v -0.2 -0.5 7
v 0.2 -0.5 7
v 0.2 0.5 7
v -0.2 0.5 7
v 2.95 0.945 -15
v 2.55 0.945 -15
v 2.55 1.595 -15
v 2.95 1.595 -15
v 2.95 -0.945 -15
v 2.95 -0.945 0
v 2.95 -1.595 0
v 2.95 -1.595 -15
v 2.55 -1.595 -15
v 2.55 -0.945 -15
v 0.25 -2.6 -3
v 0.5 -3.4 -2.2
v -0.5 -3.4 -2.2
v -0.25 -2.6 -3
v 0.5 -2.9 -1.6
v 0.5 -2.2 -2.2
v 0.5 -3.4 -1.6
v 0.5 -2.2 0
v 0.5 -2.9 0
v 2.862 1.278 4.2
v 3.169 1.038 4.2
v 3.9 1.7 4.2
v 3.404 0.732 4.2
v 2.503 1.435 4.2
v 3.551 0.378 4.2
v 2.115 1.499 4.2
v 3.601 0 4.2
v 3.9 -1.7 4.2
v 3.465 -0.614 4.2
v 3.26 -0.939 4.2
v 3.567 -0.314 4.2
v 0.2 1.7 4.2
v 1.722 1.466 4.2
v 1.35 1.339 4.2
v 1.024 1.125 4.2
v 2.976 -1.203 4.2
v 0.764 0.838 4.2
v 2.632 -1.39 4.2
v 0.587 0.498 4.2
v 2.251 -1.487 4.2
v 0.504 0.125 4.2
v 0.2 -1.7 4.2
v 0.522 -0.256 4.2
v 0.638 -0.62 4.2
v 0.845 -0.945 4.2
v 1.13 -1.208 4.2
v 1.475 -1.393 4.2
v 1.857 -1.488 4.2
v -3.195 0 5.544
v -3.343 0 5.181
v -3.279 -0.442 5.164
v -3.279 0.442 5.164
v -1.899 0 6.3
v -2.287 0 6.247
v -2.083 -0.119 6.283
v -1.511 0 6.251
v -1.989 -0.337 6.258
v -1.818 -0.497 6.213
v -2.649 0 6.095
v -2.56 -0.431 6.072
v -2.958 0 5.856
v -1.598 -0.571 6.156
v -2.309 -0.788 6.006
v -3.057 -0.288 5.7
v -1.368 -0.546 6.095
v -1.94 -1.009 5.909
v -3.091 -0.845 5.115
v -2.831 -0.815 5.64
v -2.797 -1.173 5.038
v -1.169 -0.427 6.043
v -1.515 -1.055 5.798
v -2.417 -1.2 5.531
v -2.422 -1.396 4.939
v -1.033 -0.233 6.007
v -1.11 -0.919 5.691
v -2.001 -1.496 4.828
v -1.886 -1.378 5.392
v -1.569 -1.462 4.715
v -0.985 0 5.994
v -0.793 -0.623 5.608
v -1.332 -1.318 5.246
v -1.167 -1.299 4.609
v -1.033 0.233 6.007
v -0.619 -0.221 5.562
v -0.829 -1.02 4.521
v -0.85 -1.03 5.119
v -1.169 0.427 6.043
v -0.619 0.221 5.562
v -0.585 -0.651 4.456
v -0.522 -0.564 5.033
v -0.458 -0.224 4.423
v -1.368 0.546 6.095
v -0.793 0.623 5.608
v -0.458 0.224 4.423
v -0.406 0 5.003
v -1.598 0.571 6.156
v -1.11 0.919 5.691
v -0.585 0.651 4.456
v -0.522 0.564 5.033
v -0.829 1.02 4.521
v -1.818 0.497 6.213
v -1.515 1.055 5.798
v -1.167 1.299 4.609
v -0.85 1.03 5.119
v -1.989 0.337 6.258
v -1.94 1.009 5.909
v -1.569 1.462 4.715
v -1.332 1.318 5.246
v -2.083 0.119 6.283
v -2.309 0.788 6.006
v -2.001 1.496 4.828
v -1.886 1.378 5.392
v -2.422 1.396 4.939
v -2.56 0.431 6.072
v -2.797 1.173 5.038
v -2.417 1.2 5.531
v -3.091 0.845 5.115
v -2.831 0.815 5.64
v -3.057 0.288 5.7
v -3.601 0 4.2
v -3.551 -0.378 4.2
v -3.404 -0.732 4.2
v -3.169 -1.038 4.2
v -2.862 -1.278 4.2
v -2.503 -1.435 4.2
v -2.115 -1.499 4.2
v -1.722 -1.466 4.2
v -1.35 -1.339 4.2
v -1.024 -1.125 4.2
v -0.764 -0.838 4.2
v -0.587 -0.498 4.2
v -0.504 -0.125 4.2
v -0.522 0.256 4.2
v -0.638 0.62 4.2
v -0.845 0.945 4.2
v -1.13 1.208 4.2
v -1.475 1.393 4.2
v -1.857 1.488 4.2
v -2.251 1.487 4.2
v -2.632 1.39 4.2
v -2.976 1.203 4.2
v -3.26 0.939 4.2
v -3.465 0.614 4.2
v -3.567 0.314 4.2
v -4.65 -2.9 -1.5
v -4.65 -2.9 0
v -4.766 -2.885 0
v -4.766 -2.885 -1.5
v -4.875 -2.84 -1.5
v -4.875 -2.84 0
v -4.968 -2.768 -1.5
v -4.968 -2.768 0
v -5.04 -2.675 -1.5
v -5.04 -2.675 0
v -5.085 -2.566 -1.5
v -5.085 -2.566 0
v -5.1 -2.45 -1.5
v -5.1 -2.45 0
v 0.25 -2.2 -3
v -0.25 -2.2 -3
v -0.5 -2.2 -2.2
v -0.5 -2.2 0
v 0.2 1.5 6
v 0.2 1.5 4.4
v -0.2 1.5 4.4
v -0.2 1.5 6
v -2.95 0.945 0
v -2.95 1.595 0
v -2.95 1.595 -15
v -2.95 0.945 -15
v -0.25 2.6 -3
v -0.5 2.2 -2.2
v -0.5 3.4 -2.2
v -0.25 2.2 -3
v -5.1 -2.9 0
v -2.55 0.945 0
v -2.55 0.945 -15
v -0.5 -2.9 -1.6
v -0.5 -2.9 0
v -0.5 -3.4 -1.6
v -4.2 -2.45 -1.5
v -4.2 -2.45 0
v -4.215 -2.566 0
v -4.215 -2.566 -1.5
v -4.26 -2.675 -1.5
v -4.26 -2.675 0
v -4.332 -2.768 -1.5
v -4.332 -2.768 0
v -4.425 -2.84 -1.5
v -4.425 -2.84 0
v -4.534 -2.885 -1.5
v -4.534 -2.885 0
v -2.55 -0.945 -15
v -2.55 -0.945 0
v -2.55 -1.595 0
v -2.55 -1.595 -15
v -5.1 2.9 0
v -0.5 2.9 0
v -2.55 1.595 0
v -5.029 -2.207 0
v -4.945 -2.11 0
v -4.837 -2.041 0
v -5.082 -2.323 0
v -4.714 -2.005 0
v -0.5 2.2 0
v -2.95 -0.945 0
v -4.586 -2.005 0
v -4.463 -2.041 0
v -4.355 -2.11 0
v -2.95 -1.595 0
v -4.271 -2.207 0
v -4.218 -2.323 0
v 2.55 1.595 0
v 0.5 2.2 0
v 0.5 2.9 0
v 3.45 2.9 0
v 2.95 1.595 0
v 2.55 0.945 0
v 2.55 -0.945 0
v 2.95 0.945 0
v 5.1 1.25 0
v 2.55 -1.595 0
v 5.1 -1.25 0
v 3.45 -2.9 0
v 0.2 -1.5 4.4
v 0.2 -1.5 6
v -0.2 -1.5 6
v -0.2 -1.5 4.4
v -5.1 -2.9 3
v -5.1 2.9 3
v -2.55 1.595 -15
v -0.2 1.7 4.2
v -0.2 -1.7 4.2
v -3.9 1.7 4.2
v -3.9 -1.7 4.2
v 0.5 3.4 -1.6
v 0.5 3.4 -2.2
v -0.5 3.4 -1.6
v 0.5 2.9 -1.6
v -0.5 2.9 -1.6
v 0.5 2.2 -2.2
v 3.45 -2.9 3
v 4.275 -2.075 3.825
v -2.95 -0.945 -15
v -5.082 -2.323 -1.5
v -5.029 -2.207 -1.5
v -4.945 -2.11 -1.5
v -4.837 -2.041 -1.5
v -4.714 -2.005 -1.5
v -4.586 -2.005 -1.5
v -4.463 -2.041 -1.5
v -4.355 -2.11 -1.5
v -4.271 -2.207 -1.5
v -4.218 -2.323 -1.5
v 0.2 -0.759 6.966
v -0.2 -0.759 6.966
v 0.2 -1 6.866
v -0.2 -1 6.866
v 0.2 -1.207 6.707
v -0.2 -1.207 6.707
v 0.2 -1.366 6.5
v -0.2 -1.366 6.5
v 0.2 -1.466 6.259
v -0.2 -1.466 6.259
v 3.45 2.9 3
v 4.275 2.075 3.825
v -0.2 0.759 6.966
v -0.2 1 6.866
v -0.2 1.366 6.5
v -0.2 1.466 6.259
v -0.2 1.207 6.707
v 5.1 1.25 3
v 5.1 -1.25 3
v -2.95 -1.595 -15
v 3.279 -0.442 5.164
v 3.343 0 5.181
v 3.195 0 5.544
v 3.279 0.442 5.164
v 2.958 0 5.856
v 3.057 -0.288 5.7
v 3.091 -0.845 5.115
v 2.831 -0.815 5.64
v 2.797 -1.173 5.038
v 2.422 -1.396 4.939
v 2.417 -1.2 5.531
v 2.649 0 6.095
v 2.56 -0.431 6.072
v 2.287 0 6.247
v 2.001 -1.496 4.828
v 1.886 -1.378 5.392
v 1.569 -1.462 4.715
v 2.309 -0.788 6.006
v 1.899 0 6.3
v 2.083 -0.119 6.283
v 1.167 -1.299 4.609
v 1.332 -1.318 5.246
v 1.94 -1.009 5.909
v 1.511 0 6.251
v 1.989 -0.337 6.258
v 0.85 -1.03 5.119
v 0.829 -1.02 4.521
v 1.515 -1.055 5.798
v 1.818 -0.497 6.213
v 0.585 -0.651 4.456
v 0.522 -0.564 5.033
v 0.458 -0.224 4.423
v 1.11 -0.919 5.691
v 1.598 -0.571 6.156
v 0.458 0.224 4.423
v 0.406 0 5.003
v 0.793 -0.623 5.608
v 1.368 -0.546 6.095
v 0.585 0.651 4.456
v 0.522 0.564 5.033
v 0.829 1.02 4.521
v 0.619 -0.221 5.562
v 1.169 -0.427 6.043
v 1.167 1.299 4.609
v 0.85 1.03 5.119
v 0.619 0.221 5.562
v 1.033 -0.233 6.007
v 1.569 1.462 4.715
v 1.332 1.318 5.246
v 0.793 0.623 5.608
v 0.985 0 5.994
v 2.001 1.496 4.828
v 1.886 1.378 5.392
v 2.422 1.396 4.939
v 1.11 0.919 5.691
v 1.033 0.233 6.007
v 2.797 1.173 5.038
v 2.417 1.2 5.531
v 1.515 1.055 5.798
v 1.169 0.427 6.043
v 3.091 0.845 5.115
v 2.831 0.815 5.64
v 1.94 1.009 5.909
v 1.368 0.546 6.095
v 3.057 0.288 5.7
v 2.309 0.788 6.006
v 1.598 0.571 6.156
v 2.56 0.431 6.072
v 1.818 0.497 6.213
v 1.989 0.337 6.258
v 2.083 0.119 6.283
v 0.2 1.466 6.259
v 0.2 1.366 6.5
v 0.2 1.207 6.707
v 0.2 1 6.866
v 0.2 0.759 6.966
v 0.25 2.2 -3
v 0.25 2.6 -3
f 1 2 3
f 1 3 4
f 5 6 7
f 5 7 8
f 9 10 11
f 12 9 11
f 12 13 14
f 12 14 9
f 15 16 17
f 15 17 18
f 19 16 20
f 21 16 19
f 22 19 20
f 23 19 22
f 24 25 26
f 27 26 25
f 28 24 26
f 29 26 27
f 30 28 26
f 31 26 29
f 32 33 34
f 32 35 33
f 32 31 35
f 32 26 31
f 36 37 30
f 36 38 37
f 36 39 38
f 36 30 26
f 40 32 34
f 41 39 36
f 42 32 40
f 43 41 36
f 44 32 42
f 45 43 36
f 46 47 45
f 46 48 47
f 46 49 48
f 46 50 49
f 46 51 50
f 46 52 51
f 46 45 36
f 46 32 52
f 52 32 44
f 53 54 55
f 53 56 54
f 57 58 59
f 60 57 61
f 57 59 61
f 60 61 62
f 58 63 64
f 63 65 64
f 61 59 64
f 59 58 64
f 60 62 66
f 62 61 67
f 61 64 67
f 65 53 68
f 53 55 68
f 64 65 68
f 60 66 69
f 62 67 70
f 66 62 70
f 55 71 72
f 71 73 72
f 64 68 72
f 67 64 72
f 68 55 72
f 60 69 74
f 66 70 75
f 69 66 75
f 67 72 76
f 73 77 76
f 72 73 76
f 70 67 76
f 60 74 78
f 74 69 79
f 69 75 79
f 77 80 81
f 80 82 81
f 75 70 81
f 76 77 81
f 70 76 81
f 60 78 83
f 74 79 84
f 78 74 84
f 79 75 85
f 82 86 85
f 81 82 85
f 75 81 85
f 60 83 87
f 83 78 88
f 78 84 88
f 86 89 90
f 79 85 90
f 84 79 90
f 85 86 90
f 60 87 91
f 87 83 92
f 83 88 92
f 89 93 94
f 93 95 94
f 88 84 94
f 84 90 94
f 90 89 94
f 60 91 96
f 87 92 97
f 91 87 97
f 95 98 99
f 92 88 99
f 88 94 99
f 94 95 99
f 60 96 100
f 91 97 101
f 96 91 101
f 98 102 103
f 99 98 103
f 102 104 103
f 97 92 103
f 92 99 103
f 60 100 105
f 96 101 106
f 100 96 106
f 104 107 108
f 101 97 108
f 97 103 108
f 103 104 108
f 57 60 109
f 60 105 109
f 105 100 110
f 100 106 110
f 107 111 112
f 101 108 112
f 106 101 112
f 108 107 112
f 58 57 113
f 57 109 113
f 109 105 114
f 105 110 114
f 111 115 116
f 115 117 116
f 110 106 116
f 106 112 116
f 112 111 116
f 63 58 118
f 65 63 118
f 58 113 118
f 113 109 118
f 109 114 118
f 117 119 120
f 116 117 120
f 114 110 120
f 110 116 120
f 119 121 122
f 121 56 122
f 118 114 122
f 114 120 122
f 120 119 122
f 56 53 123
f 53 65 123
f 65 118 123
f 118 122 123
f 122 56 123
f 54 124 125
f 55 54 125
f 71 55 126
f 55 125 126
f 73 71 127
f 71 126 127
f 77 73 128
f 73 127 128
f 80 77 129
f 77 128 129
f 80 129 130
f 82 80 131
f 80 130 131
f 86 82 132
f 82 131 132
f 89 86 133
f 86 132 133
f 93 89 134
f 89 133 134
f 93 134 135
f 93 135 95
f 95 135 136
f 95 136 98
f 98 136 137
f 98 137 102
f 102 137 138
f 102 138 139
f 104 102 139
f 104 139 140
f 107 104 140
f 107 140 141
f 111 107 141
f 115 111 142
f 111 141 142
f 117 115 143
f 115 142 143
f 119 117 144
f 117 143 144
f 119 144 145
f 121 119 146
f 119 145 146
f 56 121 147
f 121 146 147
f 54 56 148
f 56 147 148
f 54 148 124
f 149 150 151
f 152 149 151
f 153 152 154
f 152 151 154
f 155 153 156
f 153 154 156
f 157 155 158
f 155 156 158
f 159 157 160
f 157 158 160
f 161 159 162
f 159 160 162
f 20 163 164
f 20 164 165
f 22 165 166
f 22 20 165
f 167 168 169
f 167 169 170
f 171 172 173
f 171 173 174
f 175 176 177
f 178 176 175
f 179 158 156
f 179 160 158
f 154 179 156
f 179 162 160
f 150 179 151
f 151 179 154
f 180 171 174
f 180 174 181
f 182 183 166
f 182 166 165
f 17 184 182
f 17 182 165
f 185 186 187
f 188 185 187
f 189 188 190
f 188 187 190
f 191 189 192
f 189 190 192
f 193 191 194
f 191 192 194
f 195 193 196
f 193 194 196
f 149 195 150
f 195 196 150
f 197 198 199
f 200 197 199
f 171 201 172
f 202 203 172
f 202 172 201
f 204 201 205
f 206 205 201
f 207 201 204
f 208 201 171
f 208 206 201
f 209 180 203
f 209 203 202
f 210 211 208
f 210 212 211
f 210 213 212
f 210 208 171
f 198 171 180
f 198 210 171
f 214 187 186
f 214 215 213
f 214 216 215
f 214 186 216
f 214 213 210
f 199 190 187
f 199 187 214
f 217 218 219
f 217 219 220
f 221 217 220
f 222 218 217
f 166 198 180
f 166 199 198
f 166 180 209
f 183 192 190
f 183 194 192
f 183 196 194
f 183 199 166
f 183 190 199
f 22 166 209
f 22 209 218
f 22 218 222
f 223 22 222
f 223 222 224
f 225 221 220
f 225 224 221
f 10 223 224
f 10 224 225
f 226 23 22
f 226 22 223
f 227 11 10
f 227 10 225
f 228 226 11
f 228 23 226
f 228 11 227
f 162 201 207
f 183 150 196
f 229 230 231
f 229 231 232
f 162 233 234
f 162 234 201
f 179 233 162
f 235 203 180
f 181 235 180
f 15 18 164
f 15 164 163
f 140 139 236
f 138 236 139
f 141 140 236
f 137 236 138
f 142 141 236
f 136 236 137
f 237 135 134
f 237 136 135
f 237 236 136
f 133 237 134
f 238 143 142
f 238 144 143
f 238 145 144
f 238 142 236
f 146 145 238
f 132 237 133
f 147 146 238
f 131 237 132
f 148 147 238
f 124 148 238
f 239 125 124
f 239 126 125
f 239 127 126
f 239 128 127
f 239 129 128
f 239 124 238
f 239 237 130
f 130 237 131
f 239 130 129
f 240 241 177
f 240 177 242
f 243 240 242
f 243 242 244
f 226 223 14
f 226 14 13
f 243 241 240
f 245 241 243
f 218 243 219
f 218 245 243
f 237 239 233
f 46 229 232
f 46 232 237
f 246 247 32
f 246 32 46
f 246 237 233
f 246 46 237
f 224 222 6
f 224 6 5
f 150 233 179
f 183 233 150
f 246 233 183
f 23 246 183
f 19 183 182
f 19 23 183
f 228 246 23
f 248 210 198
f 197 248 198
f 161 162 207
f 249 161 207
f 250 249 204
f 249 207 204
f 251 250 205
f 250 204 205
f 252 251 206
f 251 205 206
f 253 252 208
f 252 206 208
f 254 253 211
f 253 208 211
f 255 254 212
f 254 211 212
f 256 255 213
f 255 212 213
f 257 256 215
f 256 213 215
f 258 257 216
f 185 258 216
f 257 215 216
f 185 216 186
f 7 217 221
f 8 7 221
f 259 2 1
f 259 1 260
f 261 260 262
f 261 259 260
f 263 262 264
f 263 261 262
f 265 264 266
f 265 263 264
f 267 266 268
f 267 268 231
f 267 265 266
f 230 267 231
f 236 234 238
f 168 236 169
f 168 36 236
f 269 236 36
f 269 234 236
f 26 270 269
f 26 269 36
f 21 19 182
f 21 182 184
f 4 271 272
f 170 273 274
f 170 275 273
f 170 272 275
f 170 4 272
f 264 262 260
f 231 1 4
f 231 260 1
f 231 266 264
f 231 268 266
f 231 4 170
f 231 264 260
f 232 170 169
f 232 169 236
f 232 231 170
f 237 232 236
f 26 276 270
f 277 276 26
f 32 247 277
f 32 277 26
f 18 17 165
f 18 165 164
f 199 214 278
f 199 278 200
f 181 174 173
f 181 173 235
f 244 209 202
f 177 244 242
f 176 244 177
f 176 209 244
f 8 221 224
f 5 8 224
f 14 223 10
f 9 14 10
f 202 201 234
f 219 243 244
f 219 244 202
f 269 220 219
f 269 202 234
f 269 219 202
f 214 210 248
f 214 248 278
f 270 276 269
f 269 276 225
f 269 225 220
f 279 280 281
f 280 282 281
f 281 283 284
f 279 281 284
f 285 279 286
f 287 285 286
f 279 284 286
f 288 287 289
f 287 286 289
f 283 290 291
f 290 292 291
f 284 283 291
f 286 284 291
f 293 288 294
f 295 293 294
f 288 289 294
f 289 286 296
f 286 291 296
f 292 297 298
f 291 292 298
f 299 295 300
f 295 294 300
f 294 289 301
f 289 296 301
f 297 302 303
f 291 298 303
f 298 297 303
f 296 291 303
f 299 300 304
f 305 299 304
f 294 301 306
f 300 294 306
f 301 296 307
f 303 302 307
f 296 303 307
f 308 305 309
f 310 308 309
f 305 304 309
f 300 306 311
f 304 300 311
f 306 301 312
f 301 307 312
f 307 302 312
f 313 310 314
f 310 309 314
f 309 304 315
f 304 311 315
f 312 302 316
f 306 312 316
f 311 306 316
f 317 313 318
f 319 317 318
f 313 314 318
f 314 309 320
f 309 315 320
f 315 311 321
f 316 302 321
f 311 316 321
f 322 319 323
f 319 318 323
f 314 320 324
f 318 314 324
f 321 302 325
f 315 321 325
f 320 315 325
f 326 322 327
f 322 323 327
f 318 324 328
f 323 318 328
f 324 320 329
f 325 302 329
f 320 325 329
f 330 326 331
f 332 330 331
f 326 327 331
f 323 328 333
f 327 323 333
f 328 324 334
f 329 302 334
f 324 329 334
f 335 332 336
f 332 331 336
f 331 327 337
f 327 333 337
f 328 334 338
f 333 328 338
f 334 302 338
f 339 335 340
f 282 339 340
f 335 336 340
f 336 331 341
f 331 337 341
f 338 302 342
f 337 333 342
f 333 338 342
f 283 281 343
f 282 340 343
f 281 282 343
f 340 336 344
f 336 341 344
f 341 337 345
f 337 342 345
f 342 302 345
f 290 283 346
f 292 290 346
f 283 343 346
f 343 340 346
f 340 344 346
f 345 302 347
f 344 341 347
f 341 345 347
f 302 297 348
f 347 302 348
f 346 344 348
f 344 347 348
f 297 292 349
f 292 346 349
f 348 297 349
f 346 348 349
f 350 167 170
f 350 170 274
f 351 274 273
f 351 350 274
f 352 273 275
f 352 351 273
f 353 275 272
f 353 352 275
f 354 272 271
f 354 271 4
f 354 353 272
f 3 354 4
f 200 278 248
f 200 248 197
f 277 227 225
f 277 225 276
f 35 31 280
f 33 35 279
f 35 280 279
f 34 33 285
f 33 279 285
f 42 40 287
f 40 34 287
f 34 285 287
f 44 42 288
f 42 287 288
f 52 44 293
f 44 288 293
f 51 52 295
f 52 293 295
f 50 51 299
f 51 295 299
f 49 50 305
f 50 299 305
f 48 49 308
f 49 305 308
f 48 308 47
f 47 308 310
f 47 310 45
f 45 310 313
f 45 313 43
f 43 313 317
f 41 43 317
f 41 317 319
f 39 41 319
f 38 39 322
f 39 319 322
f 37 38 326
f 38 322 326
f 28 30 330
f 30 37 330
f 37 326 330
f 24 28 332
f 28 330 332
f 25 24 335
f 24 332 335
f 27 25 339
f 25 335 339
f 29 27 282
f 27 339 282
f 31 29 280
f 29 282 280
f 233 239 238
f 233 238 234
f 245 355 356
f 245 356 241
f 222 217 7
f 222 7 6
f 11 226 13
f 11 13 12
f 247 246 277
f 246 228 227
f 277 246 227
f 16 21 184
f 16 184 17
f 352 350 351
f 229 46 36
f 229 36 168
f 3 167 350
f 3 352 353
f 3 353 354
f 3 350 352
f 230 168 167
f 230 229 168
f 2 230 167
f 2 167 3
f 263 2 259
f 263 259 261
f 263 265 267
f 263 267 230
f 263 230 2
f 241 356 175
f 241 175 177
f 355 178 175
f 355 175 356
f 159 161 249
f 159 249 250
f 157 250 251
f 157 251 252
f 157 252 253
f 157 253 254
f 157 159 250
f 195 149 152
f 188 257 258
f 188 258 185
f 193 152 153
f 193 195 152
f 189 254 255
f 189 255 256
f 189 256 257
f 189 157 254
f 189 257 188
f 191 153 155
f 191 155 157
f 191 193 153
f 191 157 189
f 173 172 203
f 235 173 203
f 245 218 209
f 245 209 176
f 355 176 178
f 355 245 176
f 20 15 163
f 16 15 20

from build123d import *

# Parameters (mm, degrees)
F1_DEPTH = 5
F3_DEPTH = 12.5
F5_DEPTH = 1.5
F4_W     = 0.4
F4_H     = 0.65
F6_DEPTH = 15
F7_DEPTH = 7.001


with BuildPart() as f1:
    # F0 (on Front) → F1 (new body, symmetric)
    with BuildSketch(Plane.XZ):
        Polygon((-5.1, 3), (-5.1, 0), (-0.5, 0), (-0.5, -2.2), (-0.25, -3), (0.25, -3), (0.5, -2.2), (0.5, 0), (5.1, 0), (5.1, 3), (3.9, 4.2), (3.6009409723, 4.2), (2.05, 4.2), (0.4990590277, 4.2), (0.2, 4.2), (0.2, 7), (-0.2, 7), (-0.2, 4.2), (-0.4990590277, 4.2), (-2.05, 4.2), (-3.6009409723, 4.2), (-3.9, 4.2), align=None)
    extrude(amount=F1_DEPTH, both=True)

    # F2 (on Right) → F3 (intersect, symmetric)
    with BuildSketch(Plane.YZ):
        with BuildLine():
            Line((0.5, 7), (-0.5, 7))
            ThreePointArc((-0.5, 7), (-1.2071067812, 6.7071067812), (-1.5, 6))
            Line((-1.5, 6), (-1.5, 4.4))
            Line((-1.5, 4.4), (-2.9, 3))
            Line((-2.9, 3), (-2.9, -1.6))
            Line((-2.9, -1.6), (-3.4, -1.6))
            Line((-3.4, -1.6), (-3.4, -2.2))
            Line((-3.4, -2.2), (-2.6, -3))
            Line((-2.6, -3), (-2.2, -3))
            Line((-2.2, -3), (-2.2, 0))
            Line((-2.2, 0), (2.2, 0))
            Line((2.2, 0), (2.2, -3))
            Line((2.2, -3), (2.6, -3))
            Line((2.6, -3), (3.4, -2.2))
            Line((3.4, -2.2), (3.4, -1.6))
            Line((3.4, -1.6), (2.9, -1.6))
            Line((2.9, -1.6), (2.9, 3))
            Line((2.9, 3), (1.5, 4.4))
            Line((1.5, 4.4), (1.5, 6))
            ThreePointArc((1.5, 6), (1.2071067812, 6.7071067812), (0.5, 7))
        make_face()
    extrude(amount=F3_DEPTH, both=True, mode=Mode.INTERSECT)

    # F4 (on face) → F5 (join)
    with BuildSketch(Plane(origin=(0, 0, 0), x_dir=(1, 0, 0), z_dir=(0, 0, -1))):
        with BuildLine():
            ThreePointArc((-5.1, 2.45), (-4.65, 2), (-4.2, 2.45))
            ThreePointArc((-4.2, 2.45), (-4.3318019485, 2.7681980515), (-4.65, 2.9))
            ThreePointArc((-4.65, 2.9), (-4.9681980515, 2.7681980515), (-5.1, 2.45))
        make_face()
    extrude(amount=F5_DEPTH)

    # F4 (on face) → F6 (join)
    with BuildSketch(Plane(origin=(0, 0, 0), x_dir=(1, 0, 0), z_dir=(0, 0, -1))):
        with Locations((-2.75, 1.27)):
            Rectangle(F4_W, F4_H)
        with Locations((-2.75, -1.27)):
            Rectangle(F4_W, F4_H)
        with Locations((2.75, -1.27)):
            Rectangle(F4_W, F4_H)
        with Locations((2.75, 1.27)):
            Rectangle(F4_W, F4_H)
    extrude(amount=F6_DEPTH)

    # F4 (on face) → F7 (cut, through all)
    with BuildSketch(Plane(origin=(0, 0, 0), x_dir=(1, 0, 0), z_dir=(0, 0, -1))):
        Polygon((5.1, 2.9), (3.45, 2.9), (5.1, 1.25), align=None)
        Polygon((5.1, -1.25), (3.45, -2.9), (5.1, -2.9), align=None)
    extrude(amount=-F7_DEPTH, mode=Mode.SUBTRACT)

    # F0 (on Front) → F8 (revolve)
    with BuildSketch(Plane.XZ):
        with BuildLine():
            Line((-3.3430398867, 5.1812821793), (-3.6009409723, 4.2))
            Line((-3.6009409723, 4.2), (-2.05, 4.2))
            Line((-2.05, 4.2), (-1.511025513, 6.2507321944))
            ThreePointArc((-1.511025513, 6.2507321944), (-2.6485230501, 6.0954297868), (-3.3430398867, 5.1812821793))
        make_face()
    revolve(axis=Axis((-1.025, 0, 8.1), (0.2541881195, 0, 0.9671547962)))

    # F0 (on Front) → F9 (revolve)
    with BuildSketch(Plane.XZ):
        with BuildLine():
            Line((2.05, 4.2), (3.6009409723, 4.2))
            Line((3.6009409723, 4.2), (3.3430398867, 5.1812821793))
            ThreePointArc((3.3430398867, 5.1812821793), (2.6485230501, 6.0954297868), (1.511025513, 6.2507321944))
            Line((1.511025513, 6.2507321944), (2.05, 4.2))
        make_face()
    revolve(axis=Axis((1.7805127565, 0, 5.2253660972), (0.2541881195, 0, -0.9671547962)))


solid = f1.part
